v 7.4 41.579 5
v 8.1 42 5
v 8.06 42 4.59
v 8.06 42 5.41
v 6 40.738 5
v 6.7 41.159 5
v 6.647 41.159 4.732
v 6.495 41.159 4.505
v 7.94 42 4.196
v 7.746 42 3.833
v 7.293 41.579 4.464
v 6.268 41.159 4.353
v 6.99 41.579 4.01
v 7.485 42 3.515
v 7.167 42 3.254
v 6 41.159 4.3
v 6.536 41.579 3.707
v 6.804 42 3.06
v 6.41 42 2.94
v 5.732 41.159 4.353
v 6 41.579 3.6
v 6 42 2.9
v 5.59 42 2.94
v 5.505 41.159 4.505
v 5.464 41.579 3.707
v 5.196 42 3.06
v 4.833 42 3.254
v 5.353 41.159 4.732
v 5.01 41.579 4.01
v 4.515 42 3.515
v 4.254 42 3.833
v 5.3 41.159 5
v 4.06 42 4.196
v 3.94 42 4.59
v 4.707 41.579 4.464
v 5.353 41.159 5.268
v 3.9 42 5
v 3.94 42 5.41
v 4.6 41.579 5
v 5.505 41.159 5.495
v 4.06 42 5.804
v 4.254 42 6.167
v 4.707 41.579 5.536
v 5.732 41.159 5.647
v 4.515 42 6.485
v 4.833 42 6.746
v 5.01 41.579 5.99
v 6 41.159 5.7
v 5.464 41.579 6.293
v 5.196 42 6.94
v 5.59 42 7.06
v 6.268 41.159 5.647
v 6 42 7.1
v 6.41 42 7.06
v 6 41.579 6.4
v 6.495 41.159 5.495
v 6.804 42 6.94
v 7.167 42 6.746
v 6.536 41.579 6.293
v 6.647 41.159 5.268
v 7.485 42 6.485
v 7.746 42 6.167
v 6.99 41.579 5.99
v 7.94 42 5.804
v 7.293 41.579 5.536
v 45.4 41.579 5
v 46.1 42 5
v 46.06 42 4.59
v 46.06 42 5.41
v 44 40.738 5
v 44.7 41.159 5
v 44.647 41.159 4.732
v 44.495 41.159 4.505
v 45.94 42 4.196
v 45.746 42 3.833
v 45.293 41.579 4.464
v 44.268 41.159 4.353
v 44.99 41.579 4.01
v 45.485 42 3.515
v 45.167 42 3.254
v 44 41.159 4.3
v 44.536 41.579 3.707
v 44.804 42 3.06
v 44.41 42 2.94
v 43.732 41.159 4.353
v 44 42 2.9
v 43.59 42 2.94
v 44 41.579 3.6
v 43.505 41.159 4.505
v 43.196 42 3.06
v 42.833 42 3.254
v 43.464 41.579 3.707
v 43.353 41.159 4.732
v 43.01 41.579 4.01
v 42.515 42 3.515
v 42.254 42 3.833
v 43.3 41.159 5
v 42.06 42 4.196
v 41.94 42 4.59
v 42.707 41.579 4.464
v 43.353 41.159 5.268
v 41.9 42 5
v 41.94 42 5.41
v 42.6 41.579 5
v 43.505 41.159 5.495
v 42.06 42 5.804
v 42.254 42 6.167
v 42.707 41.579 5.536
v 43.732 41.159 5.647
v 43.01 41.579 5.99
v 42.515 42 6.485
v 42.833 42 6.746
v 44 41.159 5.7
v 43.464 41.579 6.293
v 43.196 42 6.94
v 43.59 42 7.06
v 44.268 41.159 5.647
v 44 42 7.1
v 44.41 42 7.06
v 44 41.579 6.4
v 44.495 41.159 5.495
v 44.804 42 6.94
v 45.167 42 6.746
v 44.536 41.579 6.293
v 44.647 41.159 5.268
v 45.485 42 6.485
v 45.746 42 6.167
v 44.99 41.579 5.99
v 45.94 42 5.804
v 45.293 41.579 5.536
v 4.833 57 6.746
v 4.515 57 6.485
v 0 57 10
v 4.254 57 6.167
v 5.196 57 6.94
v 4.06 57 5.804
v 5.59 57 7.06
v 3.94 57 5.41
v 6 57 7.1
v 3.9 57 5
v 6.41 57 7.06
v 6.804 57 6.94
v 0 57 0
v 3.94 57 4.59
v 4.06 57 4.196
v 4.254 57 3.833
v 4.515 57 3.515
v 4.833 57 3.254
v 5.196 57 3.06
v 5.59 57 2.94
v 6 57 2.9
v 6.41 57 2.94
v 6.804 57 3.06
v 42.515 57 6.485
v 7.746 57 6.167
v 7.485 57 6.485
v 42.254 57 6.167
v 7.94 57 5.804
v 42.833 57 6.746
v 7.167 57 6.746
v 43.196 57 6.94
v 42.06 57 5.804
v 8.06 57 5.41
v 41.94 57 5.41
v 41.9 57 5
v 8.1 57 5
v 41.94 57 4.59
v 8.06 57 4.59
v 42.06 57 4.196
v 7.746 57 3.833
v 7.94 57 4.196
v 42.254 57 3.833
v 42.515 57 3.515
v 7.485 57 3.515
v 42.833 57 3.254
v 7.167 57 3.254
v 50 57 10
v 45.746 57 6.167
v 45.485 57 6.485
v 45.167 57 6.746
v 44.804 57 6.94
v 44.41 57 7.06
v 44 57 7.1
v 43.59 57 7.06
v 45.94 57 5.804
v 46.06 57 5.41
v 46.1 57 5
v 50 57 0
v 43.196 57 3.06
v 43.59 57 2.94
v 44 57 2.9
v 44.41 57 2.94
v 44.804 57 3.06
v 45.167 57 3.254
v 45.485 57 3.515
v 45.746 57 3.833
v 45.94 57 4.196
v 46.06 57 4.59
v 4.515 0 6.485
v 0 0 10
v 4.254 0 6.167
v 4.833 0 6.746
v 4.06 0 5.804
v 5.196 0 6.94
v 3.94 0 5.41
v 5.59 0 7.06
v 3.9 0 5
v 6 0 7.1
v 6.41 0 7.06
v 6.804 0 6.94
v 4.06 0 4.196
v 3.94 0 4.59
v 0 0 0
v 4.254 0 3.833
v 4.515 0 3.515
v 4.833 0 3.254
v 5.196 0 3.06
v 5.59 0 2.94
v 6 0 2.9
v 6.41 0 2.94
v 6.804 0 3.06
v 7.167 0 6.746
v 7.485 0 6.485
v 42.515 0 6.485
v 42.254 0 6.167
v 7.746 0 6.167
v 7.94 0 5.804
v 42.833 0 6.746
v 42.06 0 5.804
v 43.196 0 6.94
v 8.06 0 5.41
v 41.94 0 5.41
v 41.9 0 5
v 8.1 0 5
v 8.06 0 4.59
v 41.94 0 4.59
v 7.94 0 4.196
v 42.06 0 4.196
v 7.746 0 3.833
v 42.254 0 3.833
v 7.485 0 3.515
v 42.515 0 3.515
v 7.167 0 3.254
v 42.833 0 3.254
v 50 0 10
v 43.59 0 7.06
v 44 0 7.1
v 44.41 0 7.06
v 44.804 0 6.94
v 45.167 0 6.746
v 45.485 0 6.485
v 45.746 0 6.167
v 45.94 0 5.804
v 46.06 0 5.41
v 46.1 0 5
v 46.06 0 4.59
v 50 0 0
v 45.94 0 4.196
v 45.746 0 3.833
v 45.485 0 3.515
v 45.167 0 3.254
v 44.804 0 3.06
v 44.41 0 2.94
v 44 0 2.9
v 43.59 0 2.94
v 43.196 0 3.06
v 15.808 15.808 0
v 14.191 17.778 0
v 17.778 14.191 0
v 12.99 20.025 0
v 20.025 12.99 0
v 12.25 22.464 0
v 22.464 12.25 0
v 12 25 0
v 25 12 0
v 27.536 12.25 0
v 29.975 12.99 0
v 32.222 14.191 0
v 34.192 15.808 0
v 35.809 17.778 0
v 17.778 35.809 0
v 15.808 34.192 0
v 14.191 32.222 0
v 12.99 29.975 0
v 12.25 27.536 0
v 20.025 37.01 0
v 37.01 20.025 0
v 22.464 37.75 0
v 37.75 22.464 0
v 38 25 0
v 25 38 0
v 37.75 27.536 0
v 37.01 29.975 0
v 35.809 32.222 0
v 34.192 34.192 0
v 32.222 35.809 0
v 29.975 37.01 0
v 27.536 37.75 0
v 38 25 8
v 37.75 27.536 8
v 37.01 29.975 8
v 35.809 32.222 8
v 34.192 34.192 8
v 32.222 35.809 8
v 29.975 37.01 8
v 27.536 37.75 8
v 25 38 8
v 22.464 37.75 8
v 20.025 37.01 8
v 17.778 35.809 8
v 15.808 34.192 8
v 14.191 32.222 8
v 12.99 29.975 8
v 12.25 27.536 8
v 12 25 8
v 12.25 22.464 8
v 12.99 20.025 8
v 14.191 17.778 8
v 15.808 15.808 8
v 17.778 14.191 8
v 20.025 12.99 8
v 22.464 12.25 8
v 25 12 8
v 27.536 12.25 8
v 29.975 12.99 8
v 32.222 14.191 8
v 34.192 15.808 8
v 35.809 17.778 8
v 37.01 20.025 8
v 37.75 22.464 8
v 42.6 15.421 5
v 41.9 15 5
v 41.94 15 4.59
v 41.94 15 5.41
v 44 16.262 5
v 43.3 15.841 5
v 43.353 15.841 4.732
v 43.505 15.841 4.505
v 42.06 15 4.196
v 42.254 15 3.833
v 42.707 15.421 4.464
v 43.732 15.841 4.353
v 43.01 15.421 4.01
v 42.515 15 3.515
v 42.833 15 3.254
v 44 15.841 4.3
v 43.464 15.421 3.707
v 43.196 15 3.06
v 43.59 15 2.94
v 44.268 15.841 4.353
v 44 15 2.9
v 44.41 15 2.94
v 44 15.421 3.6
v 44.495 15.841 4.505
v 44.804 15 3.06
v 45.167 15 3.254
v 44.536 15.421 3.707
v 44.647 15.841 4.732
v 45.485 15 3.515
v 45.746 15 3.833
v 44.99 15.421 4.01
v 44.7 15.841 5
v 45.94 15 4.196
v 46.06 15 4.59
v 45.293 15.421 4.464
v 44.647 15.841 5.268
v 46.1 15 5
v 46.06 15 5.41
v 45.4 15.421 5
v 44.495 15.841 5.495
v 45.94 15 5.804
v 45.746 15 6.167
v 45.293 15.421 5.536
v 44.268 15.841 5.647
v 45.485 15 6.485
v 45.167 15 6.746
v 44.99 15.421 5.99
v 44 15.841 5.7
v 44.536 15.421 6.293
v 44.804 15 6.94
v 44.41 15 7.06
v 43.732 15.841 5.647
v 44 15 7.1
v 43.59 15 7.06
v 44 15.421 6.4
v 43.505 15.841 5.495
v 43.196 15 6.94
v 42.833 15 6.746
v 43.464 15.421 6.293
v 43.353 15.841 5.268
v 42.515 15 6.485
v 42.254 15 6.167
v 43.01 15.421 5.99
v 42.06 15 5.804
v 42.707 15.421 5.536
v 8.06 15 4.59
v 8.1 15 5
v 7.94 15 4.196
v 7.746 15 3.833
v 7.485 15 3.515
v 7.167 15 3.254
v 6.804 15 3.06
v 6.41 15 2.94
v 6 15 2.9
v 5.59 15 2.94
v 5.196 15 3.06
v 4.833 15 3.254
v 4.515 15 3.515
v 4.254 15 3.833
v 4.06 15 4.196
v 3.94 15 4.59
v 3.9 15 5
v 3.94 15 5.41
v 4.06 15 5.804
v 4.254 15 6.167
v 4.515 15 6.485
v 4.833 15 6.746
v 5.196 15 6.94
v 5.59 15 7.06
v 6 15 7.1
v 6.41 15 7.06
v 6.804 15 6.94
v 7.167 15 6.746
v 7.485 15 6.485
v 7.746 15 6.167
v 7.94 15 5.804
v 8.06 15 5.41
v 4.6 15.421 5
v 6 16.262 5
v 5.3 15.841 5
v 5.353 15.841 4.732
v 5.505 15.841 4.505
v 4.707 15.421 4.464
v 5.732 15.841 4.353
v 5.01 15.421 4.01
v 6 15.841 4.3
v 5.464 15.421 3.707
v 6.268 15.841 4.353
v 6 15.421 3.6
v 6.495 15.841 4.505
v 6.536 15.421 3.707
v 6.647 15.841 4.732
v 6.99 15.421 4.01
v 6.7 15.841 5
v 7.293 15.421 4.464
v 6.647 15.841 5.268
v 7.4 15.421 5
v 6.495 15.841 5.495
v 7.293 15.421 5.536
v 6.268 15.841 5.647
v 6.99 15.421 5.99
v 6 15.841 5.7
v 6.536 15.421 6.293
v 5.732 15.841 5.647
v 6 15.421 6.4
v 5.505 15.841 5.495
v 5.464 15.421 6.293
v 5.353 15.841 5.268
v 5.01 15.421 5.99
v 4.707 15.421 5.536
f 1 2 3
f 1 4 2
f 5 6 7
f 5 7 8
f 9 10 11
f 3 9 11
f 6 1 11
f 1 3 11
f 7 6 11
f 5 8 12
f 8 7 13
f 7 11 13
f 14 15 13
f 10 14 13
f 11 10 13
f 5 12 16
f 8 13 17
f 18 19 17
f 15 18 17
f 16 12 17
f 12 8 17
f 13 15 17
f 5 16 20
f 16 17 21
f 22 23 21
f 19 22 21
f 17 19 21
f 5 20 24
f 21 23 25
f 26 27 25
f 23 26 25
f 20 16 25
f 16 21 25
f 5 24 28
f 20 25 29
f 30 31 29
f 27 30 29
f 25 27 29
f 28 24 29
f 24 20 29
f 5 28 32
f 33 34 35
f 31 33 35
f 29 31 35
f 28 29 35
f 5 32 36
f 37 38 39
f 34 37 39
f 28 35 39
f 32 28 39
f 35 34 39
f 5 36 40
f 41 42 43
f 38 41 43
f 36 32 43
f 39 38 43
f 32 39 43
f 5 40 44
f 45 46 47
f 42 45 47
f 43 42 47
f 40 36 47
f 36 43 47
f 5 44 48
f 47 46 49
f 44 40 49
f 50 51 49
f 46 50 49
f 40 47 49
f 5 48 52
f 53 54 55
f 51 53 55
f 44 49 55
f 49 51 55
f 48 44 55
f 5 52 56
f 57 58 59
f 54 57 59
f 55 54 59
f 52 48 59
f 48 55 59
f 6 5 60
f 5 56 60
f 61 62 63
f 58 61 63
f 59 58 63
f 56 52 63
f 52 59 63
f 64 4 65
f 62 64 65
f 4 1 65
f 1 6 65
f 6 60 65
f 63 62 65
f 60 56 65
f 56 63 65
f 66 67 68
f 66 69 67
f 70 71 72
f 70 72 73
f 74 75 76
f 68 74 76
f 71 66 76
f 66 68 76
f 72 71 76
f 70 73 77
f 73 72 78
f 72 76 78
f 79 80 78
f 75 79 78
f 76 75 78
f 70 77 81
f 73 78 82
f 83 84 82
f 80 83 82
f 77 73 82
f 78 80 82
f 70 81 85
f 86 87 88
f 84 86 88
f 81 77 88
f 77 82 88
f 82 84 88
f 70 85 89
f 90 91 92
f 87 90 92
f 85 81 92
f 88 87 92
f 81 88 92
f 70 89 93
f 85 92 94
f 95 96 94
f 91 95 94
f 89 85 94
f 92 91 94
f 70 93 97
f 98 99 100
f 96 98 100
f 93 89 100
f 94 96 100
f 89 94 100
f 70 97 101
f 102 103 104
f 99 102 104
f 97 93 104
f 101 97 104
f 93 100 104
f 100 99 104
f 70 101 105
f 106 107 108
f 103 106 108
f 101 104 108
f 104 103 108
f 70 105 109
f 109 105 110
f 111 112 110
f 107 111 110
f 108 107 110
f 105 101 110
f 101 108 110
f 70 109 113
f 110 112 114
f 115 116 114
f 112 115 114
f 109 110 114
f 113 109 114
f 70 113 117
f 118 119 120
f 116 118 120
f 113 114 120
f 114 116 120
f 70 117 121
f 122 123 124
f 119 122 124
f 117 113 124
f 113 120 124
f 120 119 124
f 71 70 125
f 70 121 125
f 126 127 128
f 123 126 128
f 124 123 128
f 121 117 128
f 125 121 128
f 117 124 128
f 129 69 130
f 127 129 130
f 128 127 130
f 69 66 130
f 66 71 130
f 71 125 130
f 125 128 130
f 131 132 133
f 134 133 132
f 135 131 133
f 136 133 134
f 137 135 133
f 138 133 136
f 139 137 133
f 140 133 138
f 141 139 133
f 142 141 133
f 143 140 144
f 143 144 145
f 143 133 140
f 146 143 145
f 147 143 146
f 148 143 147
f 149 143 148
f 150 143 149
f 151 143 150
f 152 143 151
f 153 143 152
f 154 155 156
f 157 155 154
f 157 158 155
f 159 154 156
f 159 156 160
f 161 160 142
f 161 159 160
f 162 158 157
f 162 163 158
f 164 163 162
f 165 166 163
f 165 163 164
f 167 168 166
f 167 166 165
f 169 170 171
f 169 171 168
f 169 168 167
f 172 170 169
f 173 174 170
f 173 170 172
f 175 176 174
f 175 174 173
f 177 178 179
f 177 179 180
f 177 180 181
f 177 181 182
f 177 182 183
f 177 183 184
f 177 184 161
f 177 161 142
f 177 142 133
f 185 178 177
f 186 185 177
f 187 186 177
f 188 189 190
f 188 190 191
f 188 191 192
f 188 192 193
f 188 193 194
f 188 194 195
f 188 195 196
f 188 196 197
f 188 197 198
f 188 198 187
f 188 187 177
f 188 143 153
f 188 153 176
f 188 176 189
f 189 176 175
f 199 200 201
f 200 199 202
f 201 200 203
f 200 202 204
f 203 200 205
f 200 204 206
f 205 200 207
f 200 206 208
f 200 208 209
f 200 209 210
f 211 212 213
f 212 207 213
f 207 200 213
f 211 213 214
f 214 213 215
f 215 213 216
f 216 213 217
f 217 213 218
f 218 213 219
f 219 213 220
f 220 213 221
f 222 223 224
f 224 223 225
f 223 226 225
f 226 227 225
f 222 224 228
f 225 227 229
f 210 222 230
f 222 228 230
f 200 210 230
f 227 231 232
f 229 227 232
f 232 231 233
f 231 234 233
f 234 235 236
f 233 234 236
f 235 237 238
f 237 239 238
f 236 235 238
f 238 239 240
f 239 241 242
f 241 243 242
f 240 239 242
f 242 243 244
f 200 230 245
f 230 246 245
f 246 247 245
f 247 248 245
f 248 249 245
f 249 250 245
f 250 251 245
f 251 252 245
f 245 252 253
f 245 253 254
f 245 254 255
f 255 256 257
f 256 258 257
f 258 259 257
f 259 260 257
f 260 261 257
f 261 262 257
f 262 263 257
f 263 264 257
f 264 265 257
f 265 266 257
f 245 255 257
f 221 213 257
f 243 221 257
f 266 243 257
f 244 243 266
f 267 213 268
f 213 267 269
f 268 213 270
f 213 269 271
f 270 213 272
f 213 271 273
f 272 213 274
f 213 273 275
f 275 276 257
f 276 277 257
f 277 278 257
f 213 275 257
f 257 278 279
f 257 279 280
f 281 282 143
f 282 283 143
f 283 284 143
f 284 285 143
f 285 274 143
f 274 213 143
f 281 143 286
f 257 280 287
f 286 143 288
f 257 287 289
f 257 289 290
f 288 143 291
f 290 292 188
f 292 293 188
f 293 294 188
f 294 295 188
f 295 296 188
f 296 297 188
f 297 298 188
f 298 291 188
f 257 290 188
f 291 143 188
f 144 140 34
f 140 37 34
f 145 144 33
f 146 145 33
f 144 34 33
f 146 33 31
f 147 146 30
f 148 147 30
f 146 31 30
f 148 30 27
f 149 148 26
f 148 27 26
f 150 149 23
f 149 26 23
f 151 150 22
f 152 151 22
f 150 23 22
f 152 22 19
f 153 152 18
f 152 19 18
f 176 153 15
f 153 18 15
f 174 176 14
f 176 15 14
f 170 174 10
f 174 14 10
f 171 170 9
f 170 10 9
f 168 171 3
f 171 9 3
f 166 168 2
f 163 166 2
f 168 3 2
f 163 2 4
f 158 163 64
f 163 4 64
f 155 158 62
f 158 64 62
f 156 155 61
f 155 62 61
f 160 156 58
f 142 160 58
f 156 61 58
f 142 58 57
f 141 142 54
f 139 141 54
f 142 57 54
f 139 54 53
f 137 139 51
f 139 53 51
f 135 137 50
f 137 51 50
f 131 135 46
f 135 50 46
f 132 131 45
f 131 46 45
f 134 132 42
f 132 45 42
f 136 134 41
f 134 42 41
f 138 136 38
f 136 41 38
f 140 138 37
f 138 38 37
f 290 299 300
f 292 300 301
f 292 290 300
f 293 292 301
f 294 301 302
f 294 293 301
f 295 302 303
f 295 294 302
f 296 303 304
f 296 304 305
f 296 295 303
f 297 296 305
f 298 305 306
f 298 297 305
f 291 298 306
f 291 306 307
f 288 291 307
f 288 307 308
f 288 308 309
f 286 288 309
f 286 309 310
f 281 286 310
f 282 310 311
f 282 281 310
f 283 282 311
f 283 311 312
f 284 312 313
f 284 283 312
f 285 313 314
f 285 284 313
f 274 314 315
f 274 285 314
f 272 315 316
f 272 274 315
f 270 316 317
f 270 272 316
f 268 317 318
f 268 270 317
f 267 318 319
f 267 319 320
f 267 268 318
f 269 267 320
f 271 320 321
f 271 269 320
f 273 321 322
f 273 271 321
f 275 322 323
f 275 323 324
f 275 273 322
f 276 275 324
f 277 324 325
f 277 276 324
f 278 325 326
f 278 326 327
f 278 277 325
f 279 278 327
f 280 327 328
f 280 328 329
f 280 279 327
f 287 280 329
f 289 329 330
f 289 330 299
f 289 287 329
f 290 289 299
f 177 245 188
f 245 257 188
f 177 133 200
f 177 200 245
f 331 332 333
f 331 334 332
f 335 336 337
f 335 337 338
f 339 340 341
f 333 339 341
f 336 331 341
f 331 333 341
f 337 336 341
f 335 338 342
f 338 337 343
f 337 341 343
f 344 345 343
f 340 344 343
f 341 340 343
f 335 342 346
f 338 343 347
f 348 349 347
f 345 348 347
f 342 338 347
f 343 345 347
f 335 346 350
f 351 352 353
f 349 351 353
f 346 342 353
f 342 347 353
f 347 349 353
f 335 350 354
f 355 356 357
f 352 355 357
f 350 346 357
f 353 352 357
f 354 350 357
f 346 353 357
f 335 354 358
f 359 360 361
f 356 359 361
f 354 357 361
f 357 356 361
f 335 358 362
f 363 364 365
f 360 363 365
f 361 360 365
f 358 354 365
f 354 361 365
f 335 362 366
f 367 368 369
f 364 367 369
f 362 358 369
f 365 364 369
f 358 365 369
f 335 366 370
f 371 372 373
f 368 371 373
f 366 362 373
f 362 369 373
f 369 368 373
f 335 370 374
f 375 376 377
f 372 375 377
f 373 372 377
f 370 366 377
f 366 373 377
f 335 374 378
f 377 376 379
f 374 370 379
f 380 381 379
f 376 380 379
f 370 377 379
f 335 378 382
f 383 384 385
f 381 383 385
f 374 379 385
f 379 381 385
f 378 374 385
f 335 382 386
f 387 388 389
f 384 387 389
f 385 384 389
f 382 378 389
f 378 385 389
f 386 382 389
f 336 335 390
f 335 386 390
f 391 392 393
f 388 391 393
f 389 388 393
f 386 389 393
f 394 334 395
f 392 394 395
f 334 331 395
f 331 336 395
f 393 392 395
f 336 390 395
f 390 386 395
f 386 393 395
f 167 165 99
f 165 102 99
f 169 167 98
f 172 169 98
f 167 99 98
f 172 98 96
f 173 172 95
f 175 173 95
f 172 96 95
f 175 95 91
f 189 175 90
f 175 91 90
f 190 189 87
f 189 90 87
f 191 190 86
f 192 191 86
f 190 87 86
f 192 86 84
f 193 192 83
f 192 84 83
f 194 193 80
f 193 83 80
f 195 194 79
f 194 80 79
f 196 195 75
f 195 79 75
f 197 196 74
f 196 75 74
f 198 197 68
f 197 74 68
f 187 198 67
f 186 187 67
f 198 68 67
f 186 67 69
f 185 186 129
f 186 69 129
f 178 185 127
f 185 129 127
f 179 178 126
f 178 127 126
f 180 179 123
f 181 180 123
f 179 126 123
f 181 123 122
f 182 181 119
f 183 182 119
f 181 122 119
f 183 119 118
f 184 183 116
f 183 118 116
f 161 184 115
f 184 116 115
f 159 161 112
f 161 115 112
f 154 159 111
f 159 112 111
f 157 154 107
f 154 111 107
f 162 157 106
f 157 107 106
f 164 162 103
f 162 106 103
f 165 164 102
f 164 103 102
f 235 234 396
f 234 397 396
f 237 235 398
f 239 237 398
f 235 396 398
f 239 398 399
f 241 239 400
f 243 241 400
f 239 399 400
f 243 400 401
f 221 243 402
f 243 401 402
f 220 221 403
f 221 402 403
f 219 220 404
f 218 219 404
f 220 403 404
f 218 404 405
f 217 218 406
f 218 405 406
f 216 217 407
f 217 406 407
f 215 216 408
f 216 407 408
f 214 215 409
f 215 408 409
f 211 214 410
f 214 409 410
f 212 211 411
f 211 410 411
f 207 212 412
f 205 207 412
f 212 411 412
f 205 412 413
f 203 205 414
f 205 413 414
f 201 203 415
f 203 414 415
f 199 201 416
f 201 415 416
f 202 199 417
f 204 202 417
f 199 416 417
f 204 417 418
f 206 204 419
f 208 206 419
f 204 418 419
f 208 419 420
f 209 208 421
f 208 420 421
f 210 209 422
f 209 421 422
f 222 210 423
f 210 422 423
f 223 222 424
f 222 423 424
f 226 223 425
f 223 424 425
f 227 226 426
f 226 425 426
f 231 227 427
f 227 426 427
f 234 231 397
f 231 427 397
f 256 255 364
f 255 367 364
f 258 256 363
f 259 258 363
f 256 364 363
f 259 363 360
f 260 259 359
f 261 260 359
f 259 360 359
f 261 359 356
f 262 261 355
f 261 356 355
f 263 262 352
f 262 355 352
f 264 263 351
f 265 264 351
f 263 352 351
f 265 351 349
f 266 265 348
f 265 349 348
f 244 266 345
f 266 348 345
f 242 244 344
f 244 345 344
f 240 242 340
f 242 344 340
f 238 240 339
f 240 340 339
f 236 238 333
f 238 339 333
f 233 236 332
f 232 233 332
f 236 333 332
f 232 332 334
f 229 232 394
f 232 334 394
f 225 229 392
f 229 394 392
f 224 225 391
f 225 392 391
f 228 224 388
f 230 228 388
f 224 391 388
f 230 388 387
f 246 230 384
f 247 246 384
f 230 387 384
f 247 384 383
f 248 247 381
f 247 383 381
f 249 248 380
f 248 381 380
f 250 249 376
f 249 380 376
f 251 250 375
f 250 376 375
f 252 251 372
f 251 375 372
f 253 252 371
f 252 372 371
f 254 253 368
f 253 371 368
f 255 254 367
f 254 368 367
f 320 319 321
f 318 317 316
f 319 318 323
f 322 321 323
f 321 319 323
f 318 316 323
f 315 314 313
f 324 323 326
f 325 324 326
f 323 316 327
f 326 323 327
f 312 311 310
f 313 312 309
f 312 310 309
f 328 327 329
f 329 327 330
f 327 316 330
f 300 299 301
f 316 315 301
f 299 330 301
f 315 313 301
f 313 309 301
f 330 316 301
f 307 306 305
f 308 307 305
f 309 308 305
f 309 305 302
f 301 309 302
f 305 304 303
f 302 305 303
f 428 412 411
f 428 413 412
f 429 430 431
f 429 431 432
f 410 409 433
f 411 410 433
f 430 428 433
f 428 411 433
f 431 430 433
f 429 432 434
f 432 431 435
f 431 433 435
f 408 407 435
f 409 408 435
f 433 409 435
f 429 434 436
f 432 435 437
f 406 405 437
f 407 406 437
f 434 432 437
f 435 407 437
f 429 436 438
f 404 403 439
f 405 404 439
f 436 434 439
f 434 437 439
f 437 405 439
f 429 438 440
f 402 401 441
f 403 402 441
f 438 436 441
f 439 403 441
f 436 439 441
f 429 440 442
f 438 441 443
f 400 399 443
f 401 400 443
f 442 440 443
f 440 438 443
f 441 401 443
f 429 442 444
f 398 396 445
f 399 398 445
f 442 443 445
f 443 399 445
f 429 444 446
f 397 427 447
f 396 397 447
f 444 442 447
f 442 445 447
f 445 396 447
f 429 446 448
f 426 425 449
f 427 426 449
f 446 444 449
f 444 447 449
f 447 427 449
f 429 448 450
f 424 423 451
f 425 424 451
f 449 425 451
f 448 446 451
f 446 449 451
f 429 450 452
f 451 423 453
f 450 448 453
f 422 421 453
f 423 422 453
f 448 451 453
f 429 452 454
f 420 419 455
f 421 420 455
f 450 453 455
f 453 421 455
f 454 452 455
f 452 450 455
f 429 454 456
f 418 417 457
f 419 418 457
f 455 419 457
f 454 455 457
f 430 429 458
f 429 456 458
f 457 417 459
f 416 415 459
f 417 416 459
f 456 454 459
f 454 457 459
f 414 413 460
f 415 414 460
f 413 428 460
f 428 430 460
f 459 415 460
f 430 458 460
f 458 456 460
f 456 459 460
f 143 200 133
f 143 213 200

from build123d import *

# Parameters (mm, degrees)
ESBO_O1_W                                   = 50
ESBO_O1_H                                   = 57
ESBO_O1_R                                   = 13
RESSALTO_EXTRUS_O1_DEPTH                    = 8
ESBO_O3_W                                   = 50
ESBO_O3_H                                   = 57
RESSALTO_EXTRUS_O2_DEPTH                    = 2
BROCA_DE_ROSQUEAR_PARA_TARRAXA_DE_M51_D     = 4.2
BROCA_DE_ROSQUEAR_PARA_TARRAXA_DE_M51_DEPTH = 15
BROCA_DE_ROSQUEAR_PARA_TARRAXA_DE_M51_TIP   = 1.2618073
BROCA_DE_ROSQUEAR_PARA_TARRAXA_DE_M52_D     = 4.2
BROCA_DE_ROSQUEAR_PARA_TARRAXA_DE_M52_DEPTH = 15
BROCA_DE_ROSQUEAR_PARA_TARRAXA_DE_M52_TIP   = 1.2618073


with BuildPart() as part:
    # Esboço1 → Ressalto-extrusão1 (new body)
    with BuildSketch(Plane.XY):
        with Locations((25, 28.5)):
            Rectangle(ESBO_O1_W, ESBO_O1_H)
        with Locations((25, 25)):
            Circle(ESBO_O1_R, mode=Mode.SUBTRACT)
    extrude(amount=RESSALTO_EXTRUS_O1_DEPTH)

    # Esboço3 → Ressalto-extrusão2 (add)
    with BuildSketch(Plane.XY.offset(8)):
        with Locations((25, 28.5)):
            Rectangle(ESBO_O3_W, ESBO_O3_H)
    extrude(amount=RESSALTO_EXTRUS_O2_DEPTH)

    # Broca de rosquear para tarraxa de M51
    with Locations(Plane(origin=(0, 0, 0), x_dir=(-1, 0, 0), z_dir=(0, -1, 0))):
        with Locations((-6, -5), (-44, -5)):
            Hole(BROCA_DE_ROSQUEAR_PARA_TARRAXA_DE_M51_D / 2, depth=BROCA_DE_ROSQUEAR_PARA_TARRAXA_DE_M51_DEPTH)
            with Locations((0, 0, -(BROCA_DE_ROSQUEAR_PARA_TARRAXA_DE_M51_DEPTH + BROCA_DE_ROSQUEAR_PARA_TARRAXA_DE_M51_TIP / 2))):  # 118° drill point
                Cone(0, BROCA_DE_ROSQUEAR_PARA_TARRAXA_DE_M51_D / 2, BROCA_DE_ROSQUEAR_PARA_TARRAXA_DE_M51_TIP, mode=Mode.SUBTRACT)

    # Broca de rosquear para tarraxa de M52
    with Locations(Plane(origin=(0, 57, 0), x_dir=(1, 0, 0), z_dir=(0, 1, 0))):
        with Locations((6, -5), (44, -5)):
            Hole(BROCA_DE_ROSQUEAR_PARA_TARRAXA_DE_M52_D / 2, depth=BROCA_DE_ROSQUEAR_PARA_TARRAXA_DE_M52_DEPTH)
            with Locations((0, 0, -(BROCA_DE_ROSQUEAR_PARA_TARRAXA_DE_M52_DEPTH + BROCA_DE_ROSQUEAR_PARA_TARRAXA_DE_M52_TIP / 2))):  # 118° drill point
                Cone(0, BROCA_DE_ROSQUEAR_PARA_TARRAXA_DE_M52_D / 2, BROCA_DE_ROSQUEAR_PARA_TARRAXA_DE_M52_TIP, mode=Mode.SUBTRACT)


solid = part.part
